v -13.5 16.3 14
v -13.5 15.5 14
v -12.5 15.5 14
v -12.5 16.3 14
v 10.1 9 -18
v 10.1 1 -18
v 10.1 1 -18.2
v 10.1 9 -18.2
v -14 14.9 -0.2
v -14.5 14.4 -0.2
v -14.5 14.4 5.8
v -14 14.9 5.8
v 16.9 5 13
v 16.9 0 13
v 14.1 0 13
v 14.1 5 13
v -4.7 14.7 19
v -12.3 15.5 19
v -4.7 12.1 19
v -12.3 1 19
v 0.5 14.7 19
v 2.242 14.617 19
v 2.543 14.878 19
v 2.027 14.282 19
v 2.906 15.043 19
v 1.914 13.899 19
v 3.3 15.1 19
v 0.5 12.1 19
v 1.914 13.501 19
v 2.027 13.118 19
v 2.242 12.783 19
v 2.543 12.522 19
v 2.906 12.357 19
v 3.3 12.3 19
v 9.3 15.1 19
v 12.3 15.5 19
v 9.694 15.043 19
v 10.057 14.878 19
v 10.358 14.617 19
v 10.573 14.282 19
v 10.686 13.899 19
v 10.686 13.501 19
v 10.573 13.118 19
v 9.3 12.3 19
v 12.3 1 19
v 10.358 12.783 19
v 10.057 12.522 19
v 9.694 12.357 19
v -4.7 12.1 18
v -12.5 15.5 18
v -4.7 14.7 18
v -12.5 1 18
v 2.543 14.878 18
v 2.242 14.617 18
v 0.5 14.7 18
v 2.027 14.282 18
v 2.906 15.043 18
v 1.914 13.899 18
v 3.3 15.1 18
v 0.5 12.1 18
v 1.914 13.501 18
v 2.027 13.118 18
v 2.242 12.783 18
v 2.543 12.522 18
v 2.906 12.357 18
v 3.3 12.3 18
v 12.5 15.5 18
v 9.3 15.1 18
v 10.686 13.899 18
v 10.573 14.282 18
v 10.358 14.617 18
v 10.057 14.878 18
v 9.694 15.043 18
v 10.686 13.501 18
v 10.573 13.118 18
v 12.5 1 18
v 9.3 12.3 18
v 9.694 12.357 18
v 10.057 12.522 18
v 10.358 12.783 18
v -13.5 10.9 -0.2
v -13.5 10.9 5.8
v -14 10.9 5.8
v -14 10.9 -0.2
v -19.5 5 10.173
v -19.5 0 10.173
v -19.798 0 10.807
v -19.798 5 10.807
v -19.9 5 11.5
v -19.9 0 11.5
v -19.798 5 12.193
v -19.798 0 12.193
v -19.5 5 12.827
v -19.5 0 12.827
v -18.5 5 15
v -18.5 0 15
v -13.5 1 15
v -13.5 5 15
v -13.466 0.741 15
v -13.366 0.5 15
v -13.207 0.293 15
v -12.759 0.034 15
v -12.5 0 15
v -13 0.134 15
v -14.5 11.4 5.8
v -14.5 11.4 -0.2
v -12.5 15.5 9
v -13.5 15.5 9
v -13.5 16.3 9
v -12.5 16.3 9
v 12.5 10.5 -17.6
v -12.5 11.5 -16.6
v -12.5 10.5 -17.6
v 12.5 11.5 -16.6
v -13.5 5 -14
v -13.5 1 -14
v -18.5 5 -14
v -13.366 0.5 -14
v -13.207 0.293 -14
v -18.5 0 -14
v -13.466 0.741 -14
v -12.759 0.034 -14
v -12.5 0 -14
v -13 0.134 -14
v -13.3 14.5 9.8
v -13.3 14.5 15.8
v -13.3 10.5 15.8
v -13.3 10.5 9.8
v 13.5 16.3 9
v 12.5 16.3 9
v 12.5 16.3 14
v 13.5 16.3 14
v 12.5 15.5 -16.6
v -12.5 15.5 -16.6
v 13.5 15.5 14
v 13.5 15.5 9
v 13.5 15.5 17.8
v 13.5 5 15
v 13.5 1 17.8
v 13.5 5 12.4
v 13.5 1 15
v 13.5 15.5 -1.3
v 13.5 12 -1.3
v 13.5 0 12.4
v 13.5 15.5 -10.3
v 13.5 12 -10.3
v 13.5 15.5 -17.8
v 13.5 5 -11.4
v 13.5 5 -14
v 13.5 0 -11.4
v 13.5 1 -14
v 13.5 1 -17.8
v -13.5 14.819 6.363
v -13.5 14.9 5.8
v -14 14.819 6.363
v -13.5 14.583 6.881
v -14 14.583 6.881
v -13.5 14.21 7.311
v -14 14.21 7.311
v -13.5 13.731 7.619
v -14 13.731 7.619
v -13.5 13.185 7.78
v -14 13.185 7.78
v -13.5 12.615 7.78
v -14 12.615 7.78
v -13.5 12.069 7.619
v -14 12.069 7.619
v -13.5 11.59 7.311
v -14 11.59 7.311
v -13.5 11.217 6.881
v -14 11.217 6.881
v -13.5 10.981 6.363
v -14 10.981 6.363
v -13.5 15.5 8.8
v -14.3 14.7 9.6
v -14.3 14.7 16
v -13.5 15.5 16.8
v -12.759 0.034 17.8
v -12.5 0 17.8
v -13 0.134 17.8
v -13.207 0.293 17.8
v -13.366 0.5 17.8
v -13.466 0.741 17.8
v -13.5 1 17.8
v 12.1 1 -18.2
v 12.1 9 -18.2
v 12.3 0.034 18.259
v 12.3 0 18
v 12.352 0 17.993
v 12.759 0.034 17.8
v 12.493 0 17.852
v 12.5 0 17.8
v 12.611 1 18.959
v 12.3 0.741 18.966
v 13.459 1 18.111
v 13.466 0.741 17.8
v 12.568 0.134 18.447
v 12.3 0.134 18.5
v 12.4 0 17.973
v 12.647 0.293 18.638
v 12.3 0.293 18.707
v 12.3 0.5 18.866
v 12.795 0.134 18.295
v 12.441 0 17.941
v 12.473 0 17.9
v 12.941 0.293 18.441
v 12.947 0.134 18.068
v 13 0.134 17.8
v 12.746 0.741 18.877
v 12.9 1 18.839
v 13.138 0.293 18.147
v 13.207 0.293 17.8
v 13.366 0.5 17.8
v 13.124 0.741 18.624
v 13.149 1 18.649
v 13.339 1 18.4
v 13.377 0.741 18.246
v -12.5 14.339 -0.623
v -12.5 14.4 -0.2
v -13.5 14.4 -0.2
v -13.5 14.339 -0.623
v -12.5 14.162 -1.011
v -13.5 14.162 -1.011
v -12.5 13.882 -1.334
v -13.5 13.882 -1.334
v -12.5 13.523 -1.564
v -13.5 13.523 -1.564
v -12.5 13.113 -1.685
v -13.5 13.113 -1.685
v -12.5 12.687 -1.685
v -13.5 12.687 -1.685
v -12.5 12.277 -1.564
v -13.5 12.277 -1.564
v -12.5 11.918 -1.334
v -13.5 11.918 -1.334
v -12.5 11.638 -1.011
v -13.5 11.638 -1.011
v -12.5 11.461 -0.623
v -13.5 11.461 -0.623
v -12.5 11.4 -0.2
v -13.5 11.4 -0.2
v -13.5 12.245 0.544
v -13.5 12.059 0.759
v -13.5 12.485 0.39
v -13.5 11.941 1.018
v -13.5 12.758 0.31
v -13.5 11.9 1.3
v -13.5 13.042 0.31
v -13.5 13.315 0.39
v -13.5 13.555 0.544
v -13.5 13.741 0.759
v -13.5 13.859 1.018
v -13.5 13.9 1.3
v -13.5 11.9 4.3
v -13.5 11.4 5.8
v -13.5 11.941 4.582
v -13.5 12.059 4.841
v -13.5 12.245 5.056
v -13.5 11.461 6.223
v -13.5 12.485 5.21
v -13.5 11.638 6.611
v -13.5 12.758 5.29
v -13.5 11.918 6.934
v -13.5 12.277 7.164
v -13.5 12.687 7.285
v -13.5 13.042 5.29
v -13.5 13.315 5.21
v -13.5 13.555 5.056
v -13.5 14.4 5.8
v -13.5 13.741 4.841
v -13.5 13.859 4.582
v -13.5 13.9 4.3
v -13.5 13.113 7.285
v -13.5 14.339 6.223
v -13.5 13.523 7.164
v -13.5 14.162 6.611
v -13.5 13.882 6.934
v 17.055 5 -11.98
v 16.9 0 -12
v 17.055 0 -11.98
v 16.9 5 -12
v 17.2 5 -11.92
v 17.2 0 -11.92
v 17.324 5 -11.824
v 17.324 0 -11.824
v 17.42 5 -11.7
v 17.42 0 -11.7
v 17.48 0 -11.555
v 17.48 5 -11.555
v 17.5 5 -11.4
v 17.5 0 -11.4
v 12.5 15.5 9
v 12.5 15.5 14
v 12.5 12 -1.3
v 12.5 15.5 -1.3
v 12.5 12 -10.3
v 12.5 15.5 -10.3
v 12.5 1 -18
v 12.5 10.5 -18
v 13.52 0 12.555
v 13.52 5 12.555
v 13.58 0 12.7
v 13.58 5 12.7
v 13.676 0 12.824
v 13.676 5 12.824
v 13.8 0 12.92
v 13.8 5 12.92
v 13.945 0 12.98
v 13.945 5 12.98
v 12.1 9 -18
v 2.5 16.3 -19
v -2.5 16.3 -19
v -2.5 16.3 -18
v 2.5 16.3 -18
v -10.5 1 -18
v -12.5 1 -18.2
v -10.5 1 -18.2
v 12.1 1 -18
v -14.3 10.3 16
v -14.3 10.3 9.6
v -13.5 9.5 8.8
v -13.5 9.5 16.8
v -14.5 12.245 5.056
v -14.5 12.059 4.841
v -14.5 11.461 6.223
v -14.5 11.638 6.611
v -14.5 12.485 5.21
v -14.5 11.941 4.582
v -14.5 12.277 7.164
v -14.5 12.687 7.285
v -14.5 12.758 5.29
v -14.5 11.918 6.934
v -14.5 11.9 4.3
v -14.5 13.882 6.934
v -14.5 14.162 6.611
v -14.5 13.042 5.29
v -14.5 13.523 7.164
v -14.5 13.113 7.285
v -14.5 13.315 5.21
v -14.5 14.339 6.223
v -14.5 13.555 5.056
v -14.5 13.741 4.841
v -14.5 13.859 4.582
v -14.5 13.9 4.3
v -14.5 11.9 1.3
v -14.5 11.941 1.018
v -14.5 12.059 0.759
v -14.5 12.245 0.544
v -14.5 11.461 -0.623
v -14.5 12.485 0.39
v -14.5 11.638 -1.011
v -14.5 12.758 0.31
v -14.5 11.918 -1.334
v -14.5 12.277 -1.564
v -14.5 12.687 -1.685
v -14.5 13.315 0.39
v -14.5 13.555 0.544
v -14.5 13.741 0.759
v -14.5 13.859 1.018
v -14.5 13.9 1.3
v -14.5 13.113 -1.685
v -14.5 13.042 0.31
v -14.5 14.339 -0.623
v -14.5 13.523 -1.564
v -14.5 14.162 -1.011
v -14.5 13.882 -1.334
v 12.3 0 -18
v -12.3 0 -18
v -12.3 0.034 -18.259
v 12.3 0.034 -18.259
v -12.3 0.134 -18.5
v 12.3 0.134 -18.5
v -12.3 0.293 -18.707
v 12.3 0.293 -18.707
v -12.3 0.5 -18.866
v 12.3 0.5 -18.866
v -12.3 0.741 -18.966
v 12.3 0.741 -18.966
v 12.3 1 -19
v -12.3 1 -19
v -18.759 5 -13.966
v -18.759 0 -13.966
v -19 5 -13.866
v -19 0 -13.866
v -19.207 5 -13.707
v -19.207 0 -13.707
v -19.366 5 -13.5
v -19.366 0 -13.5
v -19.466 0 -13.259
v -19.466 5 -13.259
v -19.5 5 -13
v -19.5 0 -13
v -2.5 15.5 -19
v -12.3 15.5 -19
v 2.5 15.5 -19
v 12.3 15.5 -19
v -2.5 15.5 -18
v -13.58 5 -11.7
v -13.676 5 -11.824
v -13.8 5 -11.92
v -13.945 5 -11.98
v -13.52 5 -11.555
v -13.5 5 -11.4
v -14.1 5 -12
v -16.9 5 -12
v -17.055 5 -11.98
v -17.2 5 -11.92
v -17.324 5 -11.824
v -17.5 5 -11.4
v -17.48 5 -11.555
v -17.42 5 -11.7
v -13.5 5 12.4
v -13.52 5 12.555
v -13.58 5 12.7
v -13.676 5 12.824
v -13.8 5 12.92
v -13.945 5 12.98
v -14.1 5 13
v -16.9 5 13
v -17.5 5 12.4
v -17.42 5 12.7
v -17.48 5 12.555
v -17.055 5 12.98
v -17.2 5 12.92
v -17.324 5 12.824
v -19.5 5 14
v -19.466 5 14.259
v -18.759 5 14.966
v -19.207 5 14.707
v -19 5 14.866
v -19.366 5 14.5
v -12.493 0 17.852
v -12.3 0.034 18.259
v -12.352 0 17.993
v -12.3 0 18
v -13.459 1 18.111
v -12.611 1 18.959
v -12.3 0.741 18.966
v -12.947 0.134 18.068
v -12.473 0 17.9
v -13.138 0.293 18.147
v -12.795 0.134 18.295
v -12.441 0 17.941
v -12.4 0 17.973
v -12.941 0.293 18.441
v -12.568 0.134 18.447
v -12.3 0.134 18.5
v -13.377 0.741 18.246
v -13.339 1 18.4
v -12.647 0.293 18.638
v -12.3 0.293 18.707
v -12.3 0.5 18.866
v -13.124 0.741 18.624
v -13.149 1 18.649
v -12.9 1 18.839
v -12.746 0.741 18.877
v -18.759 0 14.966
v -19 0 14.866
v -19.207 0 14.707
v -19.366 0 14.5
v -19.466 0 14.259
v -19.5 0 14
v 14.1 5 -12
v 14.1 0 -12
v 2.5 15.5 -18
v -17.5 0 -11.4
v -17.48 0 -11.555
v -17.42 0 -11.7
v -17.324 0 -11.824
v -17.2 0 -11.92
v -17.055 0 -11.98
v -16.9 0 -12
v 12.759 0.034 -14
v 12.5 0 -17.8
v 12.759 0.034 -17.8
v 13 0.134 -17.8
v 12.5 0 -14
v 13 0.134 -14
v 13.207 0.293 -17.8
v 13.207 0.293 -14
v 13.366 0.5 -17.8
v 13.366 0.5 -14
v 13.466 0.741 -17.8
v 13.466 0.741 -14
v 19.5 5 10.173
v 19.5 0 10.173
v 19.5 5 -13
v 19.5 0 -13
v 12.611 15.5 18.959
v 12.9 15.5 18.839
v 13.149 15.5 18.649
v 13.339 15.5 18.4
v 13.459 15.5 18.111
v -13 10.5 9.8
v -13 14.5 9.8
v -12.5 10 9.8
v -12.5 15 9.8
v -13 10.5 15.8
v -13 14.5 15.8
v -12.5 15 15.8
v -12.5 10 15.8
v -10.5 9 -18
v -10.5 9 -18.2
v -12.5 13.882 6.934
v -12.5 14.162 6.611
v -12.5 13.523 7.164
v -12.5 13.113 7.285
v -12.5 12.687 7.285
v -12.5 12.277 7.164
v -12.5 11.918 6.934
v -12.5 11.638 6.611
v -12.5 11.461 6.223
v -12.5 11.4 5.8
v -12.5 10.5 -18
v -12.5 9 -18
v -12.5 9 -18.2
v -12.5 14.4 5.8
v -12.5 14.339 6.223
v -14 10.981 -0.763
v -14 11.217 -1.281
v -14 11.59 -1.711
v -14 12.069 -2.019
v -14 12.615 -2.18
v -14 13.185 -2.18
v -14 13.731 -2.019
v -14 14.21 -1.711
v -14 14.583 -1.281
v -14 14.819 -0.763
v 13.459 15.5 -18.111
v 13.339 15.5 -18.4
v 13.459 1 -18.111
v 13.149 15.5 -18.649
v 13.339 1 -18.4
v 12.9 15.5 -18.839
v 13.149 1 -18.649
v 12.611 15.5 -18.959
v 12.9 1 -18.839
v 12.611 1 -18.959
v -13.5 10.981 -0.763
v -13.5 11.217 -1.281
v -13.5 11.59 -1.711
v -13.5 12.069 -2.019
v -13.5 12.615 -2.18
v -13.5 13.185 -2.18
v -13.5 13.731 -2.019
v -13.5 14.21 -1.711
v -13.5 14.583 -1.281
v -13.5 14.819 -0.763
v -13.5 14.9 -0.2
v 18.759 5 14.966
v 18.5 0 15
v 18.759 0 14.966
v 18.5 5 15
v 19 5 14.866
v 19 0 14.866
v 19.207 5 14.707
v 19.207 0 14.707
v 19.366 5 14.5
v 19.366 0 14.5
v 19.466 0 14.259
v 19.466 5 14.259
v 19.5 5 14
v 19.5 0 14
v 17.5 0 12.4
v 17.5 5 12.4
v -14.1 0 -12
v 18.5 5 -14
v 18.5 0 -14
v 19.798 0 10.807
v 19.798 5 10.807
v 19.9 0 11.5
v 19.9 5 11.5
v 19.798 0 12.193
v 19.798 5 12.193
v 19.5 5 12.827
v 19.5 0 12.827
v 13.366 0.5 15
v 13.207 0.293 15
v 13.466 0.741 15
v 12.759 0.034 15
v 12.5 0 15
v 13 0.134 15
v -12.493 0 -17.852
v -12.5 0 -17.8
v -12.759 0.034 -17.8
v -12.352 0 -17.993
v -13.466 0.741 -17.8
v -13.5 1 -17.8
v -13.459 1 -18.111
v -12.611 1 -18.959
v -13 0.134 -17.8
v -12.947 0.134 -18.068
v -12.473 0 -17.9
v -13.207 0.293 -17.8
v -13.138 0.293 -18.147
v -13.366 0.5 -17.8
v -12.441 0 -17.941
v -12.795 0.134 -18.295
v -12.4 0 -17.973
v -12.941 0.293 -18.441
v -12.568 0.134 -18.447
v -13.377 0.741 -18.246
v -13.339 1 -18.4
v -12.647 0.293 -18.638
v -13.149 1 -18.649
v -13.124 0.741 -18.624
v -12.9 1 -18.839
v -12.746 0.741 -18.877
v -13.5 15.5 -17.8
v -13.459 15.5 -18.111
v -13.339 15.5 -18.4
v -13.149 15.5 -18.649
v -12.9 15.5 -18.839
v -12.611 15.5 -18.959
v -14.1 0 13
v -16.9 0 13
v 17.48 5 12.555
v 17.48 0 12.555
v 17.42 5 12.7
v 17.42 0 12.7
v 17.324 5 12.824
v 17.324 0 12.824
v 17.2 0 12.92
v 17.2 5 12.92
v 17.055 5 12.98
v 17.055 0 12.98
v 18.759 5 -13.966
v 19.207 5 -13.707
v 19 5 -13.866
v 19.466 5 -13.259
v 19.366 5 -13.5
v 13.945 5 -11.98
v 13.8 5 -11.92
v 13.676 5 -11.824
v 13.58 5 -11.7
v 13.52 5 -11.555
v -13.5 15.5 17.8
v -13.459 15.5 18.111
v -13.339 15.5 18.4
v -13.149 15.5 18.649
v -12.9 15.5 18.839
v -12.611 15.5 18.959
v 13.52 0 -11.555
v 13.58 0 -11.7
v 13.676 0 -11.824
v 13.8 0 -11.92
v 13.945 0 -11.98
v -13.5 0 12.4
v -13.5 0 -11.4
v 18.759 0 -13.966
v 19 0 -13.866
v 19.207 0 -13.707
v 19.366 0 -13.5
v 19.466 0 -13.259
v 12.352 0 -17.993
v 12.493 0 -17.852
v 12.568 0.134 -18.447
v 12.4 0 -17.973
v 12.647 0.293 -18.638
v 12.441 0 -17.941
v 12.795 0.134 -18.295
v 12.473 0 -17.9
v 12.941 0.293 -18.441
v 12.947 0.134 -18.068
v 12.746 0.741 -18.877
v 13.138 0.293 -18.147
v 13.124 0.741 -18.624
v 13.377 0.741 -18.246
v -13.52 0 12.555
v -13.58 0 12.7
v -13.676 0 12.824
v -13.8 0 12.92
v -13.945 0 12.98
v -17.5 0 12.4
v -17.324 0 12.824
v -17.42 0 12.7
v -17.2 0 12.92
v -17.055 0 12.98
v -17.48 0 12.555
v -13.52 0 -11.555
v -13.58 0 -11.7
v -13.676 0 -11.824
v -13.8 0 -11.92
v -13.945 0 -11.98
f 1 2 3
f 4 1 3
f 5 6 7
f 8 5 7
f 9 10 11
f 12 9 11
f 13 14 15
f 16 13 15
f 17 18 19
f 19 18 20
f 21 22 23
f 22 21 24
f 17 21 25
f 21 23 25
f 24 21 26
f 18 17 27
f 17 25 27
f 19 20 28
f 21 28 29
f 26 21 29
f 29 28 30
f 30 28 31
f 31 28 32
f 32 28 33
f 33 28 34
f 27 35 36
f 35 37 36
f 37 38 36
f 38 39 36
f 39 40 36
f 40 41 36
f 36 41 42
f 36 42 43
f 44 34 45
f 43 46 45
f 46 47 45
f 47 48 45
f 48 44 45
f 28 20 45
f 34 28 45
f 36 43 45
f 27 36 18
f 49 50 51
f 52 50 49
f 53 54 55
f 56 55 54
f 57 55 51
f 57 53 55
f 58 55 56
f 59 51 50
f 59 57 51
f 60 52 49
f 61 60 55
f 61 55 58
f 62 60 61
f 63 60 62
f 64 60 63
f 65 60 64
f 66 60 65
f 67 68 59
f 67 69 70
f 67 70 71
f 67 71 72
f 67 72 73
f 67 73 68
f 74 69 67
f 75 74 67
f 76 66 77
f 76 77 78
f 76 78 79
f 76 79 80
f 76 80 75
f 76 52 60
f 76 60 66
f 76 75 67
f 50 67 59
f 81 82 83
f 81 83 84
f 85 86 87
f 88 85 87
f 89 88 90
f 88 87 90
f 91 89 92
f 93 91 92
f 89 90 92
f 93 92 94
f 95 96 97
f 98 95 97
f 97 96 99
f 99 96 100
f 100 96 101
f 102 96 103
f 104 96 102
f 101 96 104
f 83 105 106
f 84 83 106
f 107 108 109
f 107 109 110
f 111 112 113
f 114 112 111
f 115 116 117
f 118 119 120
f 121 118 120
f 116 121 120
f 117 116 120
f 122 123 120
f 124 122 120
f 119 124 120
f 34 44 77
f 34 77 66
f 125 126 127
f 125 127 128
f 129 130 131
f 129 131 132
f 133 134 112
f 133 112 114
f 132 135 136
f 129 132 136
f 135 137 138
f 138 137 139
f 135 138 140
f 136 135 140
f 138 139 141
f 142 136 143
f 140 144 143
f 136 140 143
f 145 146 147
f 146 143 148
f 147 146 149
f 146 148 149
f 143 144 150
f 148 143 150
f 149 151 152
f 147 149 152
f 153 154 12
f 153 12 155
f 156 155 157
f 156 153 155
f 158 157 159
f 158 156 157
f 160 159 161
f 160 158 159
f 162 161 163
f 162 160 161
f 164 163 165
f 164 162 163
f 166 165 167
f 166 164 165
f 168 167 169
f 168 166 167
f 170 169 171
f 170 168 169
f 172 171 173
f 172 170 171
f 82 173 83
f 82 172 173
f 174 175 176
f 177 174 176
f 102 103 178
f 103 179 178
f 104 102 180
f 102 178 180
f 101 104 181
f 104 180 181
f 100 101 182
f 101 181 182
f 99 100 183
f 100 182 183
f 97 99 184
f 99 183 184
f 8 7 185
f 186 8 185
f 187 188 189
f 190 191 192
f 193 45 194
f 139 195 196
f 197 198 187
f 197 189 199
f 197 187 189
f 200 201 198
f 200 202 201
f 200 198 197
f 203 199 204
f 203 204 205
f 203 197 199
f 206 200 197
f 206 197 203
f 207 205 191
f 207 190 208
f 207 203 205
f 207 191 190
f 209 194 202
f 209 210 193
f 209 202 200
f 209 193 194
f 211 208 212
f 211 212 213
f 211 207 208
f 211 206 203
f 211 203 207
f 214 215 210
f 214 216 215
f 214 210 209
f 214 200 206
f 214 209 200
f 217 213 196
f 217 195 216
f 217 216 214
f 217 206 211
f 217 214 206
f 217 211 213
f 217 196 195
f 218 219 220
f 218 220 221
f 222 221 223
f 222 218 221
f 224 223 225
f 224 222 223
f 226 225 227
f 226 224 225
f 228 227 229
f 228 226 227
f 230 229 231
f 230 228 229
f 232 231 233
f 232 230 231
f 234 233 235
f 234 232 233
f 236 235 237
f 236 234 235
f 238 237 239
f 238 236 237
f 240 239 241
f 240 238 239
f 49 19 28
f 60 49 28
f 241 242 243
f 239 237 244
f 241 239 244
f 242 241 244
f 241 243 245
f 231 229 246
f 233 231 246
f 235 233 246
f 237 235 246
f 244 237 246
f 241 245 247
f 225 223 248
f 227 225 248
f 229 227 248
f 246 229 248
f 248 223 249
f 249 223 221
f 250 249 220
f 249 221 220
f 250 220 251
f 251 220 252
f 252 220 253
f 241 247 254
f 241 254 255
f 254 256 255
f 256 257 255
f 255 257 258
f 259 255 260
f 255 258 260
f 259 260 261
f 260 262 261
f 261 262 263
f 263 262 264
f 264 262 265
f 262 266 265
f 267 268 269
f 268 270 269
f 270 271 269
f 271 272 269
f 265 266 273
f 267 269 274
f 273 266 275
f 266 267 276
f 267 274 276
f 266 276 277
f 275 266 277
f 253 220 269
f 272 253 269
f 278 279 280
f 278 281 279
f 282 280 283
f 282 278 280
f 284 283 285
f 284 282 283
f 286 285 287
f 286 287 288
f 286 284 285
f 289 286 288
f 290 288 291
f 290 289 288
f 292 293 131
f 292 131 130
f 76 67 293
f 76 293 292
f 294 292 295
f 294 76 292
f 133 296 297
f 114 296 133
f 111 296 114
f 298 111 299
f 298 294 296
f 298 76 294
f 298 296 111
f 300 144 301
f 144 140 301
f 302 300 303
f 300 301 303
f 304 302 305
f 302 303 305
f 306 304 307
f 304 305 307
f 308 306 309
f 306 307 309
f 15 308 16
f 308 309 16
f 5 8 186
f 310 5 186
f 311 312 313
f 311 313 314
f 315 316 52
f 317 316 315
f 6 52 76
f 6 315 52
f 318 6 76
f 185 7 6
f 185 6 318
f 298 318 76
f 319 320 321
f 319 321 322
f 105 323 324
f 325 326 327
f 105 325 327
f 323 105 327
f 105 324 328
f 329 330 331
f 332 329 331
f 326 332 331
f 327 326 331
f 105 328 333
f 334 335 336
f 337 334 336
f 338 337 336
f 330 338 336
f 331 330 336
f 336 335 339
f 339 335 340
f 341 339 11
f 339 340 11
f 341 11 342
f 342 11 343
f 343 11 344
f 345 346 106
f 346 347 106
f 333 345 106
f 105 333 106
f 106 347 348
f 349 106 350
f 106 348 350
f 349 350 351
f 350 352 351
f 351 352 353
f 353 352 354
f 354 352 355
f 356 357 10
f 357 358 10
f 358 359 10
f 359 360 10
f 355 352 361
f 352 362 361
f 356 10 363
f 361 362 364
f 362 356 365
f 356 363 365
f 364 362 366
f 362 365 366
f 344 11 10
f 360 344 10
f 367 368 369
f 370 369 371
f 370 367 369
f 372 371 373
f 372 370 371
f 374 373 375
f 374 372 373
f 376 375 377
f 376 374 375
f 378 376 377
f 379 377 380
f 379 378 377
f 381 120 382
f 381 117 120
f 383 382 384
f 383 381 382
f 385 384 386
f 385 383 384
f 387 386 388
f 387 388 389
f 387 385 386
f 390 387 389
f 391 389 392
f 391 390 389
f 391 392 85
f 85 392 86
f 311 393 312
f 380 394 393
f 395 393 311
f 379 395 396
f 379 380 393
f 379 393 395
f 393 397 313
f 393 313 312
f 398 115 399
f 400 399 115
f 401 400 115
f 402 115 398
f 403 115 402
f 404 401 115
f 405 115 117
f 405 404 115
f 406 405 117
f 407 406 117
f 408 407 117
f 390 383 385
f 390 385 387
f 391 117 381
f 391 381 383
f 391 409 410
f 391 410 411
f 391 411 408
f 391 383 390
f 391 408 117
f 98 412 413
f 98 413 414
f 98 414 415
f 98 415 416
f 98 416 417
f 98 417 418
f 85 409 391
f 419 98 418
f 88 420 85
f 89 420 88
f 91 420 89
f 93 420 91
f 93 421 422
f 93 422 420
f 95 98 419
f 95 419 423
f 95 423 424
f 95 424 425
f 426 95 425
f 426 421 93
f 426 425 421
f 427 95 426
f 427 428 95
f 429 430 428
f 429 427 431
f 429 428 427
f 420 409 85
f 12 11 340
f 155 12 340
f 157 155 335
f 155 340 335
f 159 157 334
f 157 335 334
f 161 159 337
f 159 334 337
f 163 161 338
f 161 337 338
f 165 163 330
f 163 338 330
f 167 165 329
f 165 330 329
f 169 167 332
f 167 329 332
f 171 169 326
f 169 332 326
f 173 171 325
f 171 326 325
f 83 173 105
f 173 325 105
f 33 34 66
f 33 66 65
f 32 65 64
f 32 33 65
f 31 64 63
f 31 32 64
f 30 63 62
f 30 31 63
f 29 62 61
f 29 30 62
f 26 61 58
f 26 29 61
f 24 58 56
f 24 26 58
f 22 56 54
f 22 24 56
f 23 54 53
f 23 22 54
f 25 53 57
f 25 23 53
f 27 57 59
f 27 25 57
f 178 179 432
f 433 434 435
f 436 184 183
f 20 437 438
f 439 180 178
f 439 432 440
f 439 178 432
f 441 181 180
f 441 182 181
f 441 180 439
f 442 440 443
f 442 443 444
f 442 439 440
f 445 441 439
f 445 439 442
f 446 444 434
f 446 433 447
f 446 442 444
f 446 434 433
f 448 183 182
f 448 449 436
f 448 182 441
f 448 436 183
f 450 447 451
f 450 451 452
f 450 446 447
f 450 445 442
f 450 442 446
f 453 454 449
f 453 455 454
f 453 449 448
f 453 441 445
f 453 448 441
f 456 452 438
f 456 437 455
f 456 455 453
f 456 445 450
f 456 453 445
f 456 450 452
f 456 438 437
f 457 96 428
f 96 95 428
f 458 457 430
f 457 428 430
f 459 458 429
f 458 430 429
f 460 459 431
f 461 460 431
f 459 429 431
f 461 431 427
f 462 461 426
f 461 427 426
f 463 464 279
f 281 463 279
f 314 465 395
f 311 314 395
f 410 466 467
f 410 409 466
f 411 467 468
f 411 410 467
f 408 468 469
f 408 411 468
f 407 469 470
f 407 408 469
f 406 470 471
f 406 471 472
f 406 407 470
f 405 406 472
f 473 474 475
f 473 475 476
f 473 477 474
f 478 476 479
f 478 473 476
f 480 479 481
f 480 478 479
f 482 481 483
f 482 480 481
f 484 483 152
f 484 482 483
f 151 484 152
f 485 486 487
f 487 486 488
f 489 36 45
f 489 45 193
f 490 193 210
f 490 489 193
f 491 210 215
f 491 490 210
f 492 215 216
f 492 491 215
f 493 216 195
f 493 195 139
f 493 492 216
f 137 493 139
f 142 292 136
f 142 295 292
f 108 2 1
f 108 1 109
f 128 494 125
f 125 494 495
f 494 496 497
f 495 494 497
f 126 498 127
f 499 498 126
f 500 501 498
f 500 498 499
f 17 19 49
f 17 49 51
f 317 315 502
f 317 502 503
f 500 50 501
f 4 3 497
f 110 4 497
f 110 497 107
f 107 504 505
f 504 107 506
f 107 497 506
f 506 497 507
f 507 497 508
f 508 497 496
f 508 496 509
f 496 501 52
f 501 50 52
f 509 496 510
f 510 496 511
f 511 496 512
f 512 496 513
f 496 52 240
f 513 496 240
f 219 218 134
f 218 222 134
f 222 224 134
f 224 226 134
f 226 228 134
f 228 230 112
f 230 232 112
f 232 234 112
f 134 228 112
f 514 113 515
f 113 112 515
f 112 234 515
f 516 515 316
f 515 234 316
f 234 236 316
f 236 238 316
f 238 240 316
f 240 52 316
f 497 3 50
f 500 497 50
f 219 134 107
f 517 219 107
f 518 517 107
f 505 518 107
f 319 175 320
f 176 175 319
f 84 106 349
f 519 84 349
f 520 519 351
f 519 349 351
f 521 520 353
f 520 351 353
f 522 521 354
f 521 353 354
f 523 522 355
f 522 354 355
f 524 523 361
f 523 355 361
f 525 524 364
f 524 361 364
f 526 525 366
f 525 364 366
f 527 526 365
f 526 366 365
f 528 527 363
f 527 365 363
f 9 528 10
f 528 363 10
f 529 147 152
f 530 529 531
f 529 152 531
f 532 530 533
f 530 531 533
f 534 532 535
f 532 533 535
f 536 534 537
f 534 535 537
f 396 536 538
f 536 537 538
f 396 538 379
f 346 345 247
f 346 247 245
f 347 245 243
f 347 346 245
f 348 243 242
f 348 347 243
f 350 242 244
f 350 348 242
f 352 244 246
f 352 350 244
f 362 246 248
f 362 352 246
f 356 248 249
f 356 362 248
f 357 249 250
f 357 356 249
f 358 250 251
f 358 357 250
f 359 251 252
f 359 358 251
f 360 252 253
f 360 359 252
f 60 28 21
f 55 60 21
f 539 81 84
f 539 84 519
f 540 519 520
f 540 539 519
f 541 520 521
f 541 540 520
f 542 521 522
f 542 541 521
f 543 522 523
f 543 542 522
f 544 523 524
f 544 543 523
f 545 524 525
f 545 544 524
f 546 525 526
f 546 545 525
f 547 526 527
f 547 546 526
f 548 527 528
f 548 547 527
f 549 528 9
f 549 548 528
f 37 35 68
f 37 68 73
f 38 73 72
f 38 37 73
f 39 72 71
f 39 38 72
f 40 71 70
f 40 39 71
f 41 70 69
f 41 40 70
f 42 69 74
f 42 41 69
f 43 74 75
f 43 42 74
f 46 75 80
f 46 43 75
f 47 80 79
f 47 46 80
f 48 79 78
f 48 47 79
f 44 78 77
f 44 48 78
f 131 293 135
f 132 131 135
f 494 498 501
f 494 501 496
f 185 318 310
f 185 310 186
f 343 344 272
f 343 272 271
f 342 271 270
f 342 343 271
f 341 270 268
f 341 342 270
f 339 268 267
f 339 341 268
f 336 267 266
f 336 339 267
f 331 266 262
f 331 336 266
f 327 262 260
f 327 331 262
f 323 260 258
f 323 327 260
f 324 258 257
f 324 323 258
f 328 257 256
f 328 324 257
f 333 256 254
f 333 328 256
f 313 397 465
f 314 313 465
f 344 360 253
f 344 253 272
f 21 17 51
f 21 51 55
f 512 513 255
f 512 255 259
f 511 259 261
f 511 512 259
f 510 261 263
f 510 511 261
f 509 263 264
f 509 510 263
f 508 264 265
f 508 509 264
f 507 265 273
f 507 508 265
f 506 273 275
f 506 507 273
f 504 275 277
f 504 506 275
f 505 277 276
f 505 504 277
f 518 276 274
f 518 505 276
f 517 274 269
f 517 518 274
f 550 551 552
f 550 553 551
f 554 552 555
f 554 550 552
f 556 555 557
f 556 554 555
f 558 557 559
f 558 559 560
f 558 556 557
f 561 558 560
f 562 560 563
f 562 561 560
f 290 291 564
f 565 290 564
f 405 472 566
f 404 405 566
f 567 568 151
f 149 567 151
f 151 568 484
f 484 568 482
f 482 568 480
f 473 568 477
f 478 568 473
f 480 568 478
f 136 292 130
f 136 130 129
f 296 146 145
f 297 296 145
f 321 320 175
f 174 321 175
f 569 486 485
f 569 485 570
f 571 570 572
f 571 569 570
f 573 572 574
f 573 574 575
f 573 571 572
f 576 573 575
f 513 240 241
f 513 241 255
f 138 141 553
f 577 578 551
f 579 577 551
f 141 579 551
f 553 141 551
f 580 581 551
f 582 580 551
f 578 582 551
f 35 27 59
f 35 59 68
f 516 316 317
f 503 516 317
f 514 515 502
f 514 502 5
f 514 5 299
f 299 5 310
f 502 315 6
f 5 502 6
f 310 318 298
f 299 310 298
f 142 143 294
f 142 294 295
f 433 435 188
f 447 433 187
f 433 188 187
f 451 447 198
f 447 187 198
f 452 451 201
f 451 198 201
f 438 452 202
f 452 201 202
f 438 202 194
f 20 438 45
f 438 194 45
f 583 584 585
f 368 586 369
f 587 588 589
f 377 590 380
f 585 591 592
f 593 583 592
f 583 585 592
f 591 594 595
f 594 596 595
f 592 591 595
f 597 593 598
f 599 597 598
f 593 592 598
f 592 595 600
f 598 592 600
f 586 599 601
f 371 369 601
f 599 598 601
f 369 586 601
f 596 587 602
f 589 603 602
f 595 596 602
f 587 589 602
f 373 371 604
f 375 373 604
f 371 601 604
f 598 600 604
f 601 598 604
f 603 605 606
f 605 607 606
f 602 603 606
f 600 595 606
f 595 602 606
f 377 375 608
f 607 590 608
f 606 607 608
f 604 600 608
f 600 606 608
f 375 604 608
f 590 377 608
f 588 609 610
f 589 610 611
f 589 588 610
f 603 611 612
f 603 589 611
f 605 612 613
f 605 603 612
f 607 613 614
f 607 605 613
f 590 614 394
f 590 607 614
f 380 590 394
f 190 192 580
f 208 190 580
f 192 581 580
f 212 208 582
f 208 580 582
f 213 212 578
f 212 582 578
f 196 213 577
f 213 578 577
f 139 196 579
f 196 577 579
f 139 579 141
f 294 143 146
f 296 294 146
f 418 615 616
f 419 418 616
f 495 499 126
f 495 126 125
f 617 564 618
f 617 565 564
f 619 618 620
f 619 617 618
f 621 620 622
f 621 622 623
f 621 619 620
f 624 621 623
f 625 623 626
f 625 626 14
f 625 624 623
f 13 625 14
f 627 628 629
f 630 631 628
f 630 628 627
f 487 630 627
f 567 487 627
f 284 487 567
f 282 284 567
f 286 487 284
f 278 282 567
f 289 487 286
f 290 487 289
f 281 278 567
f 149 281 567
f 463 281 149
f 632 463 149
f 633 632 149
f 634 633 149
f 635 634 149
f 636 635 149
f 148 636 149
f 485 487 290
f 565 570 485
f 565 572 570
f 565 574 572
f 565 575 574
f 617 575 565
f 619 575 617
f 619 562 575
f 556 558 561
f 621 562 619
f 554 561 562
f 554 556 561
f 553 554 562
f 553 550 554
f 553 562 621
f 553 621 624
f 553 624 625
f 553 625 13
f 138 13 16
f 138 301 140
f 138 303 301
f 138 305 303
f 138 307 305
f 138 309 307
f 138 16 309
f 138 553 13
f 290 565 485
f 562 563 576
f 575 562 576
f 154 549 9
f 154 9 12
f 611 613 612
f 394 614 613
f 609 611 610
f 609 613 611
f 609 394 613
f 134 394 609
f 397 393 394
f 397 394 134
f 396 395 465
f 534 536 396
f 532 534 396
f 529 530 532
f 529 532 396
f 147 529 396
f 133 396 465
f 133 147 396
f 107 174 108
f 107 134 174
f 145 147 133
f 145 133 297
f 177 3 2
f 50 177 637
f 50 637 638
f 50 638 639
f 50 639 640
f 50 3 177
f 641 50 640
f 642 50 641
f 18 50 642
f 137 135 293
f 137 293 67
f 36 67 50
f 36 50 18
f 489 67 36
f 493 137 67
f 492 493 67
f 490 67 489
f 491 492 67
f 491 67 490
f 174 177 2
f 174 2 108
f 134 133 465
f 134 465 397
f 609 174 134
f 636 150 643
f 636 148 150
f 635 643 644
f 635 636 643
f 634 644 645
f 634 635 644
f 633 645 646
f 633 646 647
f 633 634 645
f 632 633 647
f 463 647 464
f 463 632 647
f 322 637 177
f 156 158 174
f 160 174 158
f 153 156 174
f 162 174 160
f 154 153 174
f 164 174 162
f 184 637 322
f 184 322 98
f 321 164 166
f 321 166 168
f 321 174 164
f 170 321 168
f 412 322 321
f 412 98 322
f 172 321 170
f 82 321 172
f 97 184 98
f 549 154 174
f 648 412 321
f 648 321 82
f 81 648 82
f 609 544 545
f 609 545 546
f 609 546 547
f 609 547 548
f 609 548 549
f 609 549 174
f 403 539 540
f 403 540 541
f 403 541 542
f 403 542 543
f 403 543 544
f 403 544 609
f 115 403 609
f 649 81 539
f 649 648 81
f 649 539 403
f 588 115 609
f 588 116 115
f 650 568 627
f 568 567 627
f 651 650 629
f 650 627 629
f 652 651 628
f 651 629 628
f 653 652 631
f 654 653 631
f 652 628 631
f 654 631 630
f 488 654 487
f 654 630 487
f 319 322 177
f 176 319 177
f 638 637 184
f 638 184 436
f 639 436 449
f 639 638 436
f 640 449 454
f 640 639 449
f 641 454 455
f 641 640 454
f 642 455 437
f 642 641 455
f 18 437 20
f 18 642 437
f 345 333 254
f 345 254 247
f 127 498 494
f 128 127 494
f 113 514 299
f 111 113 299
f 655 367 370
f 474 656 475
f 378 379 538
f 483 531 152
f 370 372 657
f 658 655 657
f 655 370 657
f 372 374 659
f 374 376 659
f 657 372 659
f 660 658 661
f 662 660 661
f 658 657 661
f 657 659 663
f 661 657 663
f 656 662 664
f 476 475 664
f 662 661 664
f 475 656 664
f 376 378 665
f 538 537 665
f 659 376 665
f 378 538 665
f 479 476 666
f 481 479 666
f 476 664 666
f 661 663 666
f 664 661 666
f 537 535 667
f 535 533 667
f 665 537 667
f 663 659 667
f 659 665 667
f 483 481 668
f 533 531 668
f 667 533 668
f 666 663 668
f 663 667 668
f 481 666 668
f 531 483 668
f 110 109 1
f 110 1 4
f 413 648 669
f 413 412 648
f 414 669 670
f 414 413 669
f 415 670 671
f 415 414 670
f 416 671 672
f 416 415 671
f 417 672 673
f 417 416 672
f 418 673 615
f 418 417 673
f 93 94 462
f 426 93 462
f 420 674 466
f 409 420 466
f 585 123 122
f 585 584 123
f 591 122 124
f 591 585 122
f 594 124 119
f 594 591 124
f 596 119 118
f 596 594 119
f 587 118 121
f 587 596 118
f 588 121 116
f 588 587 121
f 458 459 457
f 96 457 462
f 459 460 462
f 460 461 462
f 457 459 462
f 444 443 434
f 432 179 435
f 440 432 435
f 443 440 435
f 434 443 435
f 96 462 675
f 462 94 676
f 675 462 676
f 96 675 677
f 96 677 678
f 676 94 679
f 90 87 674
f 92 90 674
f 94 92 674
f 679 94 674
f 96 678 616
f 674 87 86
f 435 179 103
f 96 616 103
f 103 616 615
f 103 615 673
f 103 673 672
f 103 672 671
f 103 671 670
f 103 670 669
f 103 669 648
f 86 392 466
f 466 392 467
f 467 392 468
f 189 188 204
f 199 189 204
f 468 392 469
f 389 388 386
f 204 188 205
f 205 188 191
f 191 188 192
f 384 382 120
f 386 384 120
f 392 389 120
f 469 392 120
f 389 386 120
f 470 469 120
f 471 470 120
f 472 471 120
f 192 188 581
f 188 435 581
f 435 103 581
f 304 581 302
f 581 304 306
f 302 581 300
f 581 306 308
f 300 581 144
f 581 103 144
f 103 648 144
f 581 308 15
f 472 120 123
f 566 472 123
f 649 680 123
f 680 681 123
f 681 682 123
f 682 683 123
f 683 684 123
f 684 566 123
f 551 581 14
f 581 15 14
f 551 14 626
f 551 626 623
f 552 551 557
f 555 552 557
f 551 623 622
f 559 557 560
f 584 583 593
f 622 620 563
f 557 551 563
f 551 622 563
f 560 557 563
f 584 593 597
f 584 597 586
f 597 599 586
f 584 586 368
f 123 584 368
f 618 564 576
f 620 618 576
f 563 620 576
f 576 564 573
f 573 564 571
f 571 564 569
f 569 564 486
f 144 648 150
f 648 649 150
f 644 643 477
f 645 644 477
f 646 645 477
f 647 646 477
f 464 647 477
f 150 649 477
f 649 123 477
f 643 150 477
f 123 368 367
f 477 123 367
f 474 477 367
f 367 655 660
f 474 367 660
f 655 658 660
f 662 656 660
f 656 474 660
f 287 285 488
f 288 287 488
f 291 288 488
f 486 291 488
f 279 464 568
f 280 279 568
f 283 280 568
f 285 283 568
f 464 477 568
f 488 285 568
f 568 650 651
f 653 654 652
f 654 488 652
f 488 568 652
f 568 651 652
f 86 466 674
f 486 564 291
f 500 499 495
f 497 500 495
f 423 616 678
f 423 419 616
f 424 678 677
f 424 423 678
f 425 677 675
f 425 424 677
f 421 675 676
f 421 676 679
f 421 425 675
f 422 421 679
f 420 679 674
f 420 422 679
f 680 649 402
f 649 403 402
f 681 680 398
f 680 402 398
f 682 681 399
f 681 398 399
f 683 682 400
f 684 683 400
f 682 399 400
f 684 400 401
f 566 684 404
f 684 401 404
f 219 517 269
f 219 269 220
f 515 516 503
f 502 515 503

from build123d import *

# Parameters (mm, degrees)
SKETCH_1_W          = 27
SKETCH_1_H          = 38
EXTRUDE_1_DEPTH     = 1
SKETCH_3_W          = 27
SKETCH_3_H          = 38
SKETCH_3_W_2        = 25
SKETCH_3_H_2        = 36
EXTRUDE_2_DEPTH     = 14.5
FILLET_1_R          = 1.2
EXTRUDE_3_DEPTH     = 5
FILLET_3_R          = 1
FILLET_4_R          = 0.6
FILLET_6_R          = 1
CUT_EXTRUDE_1_REACH = 47.437
CUT_EXTRUDE_2_REACH = 43.113
SKETCH_6_W          = 9
SKETCH_6_H          = 3.5
EXTRUDE_4_DEPTH     = 5
CUT_EXTRUDE_3_REACH = 47.61
SKETCH_8_W          = 5.2
SKETCH_8_H          = 2.6
SKETCH_13_W         = 6
SKETCH_13_H         = 4
CUT_EXTRUDE_6_DEPTH = 0.8
SKETCH_15_W         = 25
SKETCH_15_H         = 5
EXTRUDE_5_DEPTH     = 1.4
CHAMFER_3_SIZE      = 1
SKETCH_16_W         = 2
SKETCH_16_H         = 0.2
CUT_EXTRUDE_7_DEPTH = 8
SKETCH_18_W         = 5
SKETCH_18_H         = 1
SKETCH_18_W_2       = 1
SKETCH_18_H_2       = 5
EXTRUDE_6_DEPTH     = 0.8
EXTRUDE_9_DEPTH     = 1
CUT_EXTRUDE_8_REACH = 44.545
CUT_EXTRUDE_9_DEPTH = 1
CHAMFER_4_SIZE      = 0.5
SKETCH_22_W         = 8
SKETCH_22_H         = 6
EXTRUDE_10_DEPTH    = 0.8
CHAMFER_6_SIZE      = 0.8
CHAMFER_7_SIZE      = 0.5


with BuildPart() as part:
    # 草图1 → 凸台-拉伸1 (new body)
    with BuildSketch(Plane(origin=(0, 0, 0), x_dir=(1, 0, 0), z_dir=(0, 1, 0))):
        Rectangle(SKETCH_1_W, SKETCH_1_H)
    extrude(amount=EXTRUDE_1_DEPTH)

    # 草图3 → 凸台-拉伸2 (add)
    with BuildSketch(Plane(origin=(0, 1, 0), x_dir=(1, 0, 0), z_dir=(0, 1, 0))):
        Rectangle(SKETCH_3_W, SKETCH_3_H)
        Rectangle(SKETCH_3_W_2, SKETCH_3_H_2, mode=Mode.SUBTRACT)
    extrude(amount=EXTRUDE_2_DEPTH)

    # 圆角1
    fillet_1_edges = [part.edges().sort_by_distance(p)[0] for p in [
        (13.5, 7.75, 19),
        (-13.5, 7.75, 19),
        (-13.5, 7.75, -19),
        (13.5, 7.75, -19),
    ]]
    fillet(fillet_1_edges, radius=FILLET_1_R)

    # 草图4 → 凸台-拉伸3 (add)
    with BuildSketch(Plane.XZ):
        Polygon((13.5, 15), (19.5, 15), (19.5, -14), (13.5, -14), (13.5, -12), (17.5, -12), (17.5, 13), (13.5, 13), align=None)
        Polygon((-17.5, 13), (-17.5, -12), (-13.5, -12), (-13.5, -14), (-19.5, -14), (-19.5, 15), (-13.5, 15), (-13.5, 13), align=None)
    extrude(amount=-EXTRUDE_3_DEPTH)

    # 圆角3
    fillet_3_edges = [part.edges().sort_by_distance(p)[0] for p in [
        (19.5, 2.5, 15),
        (19.5, 2.5, -14),
        (-19.5, 2.5, -14),
        (-19.5, 2.5, 15),
    ]]
    fillet(fillet_3_edges, radius=FILLET_3_R)

    # 圆角4
    fillet_4_edges = [part.edges().sort_by_distance(p)[0] for p in [
        (13.5, 2.5, 13),
        (13.5, 2.5, -12),
        (17.5, 2.5, -12),
        (17.5, 2.5, 13),
        (-13.5, 2.5, 13),
        (-17.5, 2.5, 13),
        (-17.5, 2.5, -12),
        (-13.5, 2.5, -12),
    ]]
    fillet(fillet_4_edges, radius=FILLET_4_R)

    # 圆角6
    fillet_6_edges = [part.edges().sort_by_distance(p)[0] for p in [
        (0, 0, -19),
        (13.5, 0, 16.4),
        (0, 0, 19),
        (-13.5, 0, -15.9),
        (13.148528137, 0, 18.648528137),
        (-13.148528137, 0, 18.648528137),
        (-13.148528137, 0, -18.648528137),
        (13.148528137, 0, -18.648528137),
        (13.5, 0, -15.9),
        (-13.5, 0, 16.4),
    ]]
    fillet(fillet_6_edges, radius=FILLET_6_R)

    # 草图5 → 切除-拉伸1 (cut, up to next)
    with BuildSketch(Plane.XY.offset(19), mode=Mode.PRIVATE) as cut_extrude_1_sk1:
        with BuildLine():
            Line((3.3, 15.1), (9.3, 15.1))
            ThreePointArc((9.3, 15.1), (10.7, 13.7), (9.3, 12.3))
            Line((9.3, 12.3), (3.3, 12.3))
            ThreePointArc((3.3, 12.3), (1.9, 13.7), (3.3, 15.1))
        make_face()
    cut_extrude_1_tool1 = extrude(cut_extrude_1_sk1.sketch, amount=-CUT_EXTRUDE_1_REACH, mode=Mode.PRIVATE) & part.part
    add(cut_extrude_1_tool1.solids().sort_by_distance((6.3, 13.7, 19))[0], mode=Mode.SUBTRACT)

    # 草图6 → 切除-拉伸2 (cut, up to next)
    with BuildSketch(Plane(origin=(13.5, 0, 0), x_dir=(0, 0, -1), z_dir=(1, 0, 0)), mode=Mode.PRIVATE) as cut_extrude_2_sk1:
        with Locations((5.8, 13.75)):
            Rectangle(SKETCH_6_W, SKETCH_6_H)
    cut_extrude_2_tool1 = extrude(cut_extrude_2_sk1.sketch, amount=-CUT_EXTRUDE_2_REACH, mode=Mode.PRIVATE) & part.part
    add(cut_extrude_2_tool1.solids().sort_by_distance((13.5, 13.75, -5.8))[0], mode=Mode.SUBTRACT)

    # 草图7 → 凸台-拉伸4 (add)
    with BuildSketch(Plane.XZ):
        with BuildLine():
            Line((19.5, 12.826649916), (19.5, 10.173350084))
            ThreePointArc((19.5, 10.173350084), (19.9, 11.5), (19.5, 12.826649916))
        make_face()
        with BuildLine():
            Line((-19.5, 12.826649916), (-19.5, 10.173350084))
            ThreePointArc((-19.5, 10.173350084), (-19.9, 11.5), (-19.5, 12.826649916))
        make_face()
    extrude(amount=-EXTRUDE_4_DEPTH)

    # 草图8 → 切除-拉伸3 (cut, up to next)
    with BuildSketch(Plane.XY.offset(19), mode=Mode.PRIVATE) as cut_extrude_3_sk1:
        with Locations((-2.1, 13.4)):
            Rectangle(SKETCH_8_W, SKETCH_8_H)
    cut_extrude_3_tool1 = extrude(cut_extrude_3_sk1.sketch, amount=-CUT_EXTRUDE_3_REACH, mode=Mode.PRIVATE) & part.part
    add(cut_extrude_3_tool1.solids().sort_by_distance((-2.1, 13.4, 19))[0], mode=Mode.SUBTRACT)

    # 草图13 → 切除-拉伸6 (cut)
    with BuildSketch(Plane(origin=(-12.5, 0, 0), x_dir=(0, 0, -1), z_dir=(1, 0, 0))):
        with Locations((-12.8, 12.5)):
            Rectangle(SKETCH_13_W, SKETCH_13_H)
    extrude(amount=-CUT_EXTRUDE_6_DEPTH, mode=Mode.SUBTRACT)

    # 草图15 → 凸台-拉伸5 (add)
    with BuildSketch(Plane.XY.offset(-18)):
        with Locations((0, 13)):
            Rectangle(SKETCH_15_W, SKETCH_15_H)
    extrude(amount=EXTRUDE_5_DEPTH)

    # 倒角3
    chamfer_3_edges = [part.edges().sort_by_distance(p)[0] for p in [
        (0, 10.5, -16.6),
    ]]
    chamfer(chamfer_3_edges, length=CHAMFER_3_SIZE)

    # 草图16 → 切除-拉伸7 (cut)
    with BuildSketch(Plane(origin=(0, 1, 0), x_dir=(1, 0, 0), z_dir=(0, 1, 0))):
        with Locations((-11.5, 18.1)):
            Rectangle(SKETCH_16_W, SKETCH_16_H)
        with Locations((11.1, 18.1)):
            Rectangle(SKETCH_16_W, SKETCH_16_H)
    extrude(amount=CUT_EXTRUDE_7_DEPTH, mode=Mode.SUBTRACT)

    # 草图18 → 凸台-拉伸6 (add)
    with BuildSketch(Plane(origin=(0, 15.5, 0), x_dir=(1, 0, 0), z_dir=(0, 1, 0))):
        with Locations((0, 18.5)):
            Rectangle(SKETCH_18_W, SKETCH_18_H)
        with Locations((-13, -11.5)):
            Rectangle(SKETCH_18_W_2, SKETCH_18_H_2)
        with Locations((13, -11.5)):
            Rectangle(SKETCH_18_W_2, SKETCH_18_H_2)
    extrude(amount=EXTRUDE_6_DEPTH)

    # 草图19 → 凸台-拉伸9 (add)
    with BuildSketch(Plane.ZY.offset(13.5)):
        with BuildLine():
            Line((-0.2, 14.9), (5.8, 14.9))
            ThreePointArc((5.8, 14.9), (7.8, 12.9), (5.8, 10.9))
            Line((5.8, 10.9), (-0.2, 10.9))
            ThreePointArc((-0.2, 10.9), (-2.2, 12.9), (-0.2, 14.9))
        make_face()
    extrude(amount=EXTRUDE_9_DEPTH)

    # 草图20 → 切除-拉伸8 (cut, up to next)
    with BuildSketch(Plane.ZY.offset(14.5), mode=Mode.PRIVATE) as cut_extrude_8_sk1:
        with BuildLine():
            Line((1.3, 13.9), (4.3, 13.9))
            ThreePointArc((4.3, 13.9), (5.3, 12.9), (4.3, 11.9))
            Line((4.3, 11.9), (1.3, 11.9))
            ThreePointArc((1.3, 11.9), (0.3, 12.9), (1.3, 13.9))
        make_face()
    cut_extrude_8_tool1 = extrude(cut_extrude_8_sk1.sketch, amount=-CUT_EXTRUDE_8_REACH, mode=Mode.PRIVATE) & part.part
    add(cut_extrude_8_tool1.solids().sort_by_distance((-14.5, 12.9, 2.8))[0], mode=Mode.SUBTRACT)

    # 草图21 → 切除-拉伸9 (cut)
    with BuildSketch(Plane(origin=(-12.5, 0, 0), x_dir=(0, 0, -1), z_dir=(1, 0, 0))):
        with BuildLine():
            Line((-5.8, 14.4), (0.2, 14.4))
            ThreePointArc((0.2, 14.4), (1.7, 12.9), (0.2, 11.4))
            Line((0.2, 11.4), (-5.8, 11.4))
            ThreePointArc((-5.8, 11.4), (-7.3, 12.9), (-5.8, 14.4))
        make_face()
    extrude(amount=-CUT_EXTRUDE_9_DEPTH, mode=Mode.SUBTRACT)

    # 倒角4
    chamfer_4_edges = [part.edges().sort_by_distance(p)[0] for p in [
        (-14.5, 12.9, -2.2),
        (-14.5, 10.9, 2.8),
        (-14.5, 12.9, 7.8),
        (-14.5, 14.9, 2.8),
    ]]
    chamfer(chamfer_4_edges, length=CHAMFER_4_SIZE)

    # 草图22 → 凸台-拉伸10 (add)
    with BuildSketch(Plane.ZY.offset(13.5)):
        with Locations((12.8, 12.5)):
            Rectangle(SKETCH_22_W, SKETCH_22_H)
    extrude(amount=EXTRUDE_10_DEPTH)

    # 倒角6
    chamfer_6_edges = [part.edges().sort_by_distance(p)[0] for p in [
        (-14.3, 12.5, 16.8),
        (-14.3, 9.5, 12.8),
        (-14.3, 15.5, 12.8),
        (-14.3, 12.5, 8.8),
    ]]
    chamfer(chamfer_6_edges, length=CHAMFER_6_SIZE - 0.0001)  # a hair under: the kernel refuses the full size

    # 倒角7
    chamfer_7_edges = [part.edges().sort_by_distance(p)[0] for p in [
        (-12.5, 10.5, 12.8),
        (-12.5, 14.5, 12.8),
    ]]
    chamfer(chamfer_7_edges, length=CHAMFER_7_SIZE)


solid = part.part
